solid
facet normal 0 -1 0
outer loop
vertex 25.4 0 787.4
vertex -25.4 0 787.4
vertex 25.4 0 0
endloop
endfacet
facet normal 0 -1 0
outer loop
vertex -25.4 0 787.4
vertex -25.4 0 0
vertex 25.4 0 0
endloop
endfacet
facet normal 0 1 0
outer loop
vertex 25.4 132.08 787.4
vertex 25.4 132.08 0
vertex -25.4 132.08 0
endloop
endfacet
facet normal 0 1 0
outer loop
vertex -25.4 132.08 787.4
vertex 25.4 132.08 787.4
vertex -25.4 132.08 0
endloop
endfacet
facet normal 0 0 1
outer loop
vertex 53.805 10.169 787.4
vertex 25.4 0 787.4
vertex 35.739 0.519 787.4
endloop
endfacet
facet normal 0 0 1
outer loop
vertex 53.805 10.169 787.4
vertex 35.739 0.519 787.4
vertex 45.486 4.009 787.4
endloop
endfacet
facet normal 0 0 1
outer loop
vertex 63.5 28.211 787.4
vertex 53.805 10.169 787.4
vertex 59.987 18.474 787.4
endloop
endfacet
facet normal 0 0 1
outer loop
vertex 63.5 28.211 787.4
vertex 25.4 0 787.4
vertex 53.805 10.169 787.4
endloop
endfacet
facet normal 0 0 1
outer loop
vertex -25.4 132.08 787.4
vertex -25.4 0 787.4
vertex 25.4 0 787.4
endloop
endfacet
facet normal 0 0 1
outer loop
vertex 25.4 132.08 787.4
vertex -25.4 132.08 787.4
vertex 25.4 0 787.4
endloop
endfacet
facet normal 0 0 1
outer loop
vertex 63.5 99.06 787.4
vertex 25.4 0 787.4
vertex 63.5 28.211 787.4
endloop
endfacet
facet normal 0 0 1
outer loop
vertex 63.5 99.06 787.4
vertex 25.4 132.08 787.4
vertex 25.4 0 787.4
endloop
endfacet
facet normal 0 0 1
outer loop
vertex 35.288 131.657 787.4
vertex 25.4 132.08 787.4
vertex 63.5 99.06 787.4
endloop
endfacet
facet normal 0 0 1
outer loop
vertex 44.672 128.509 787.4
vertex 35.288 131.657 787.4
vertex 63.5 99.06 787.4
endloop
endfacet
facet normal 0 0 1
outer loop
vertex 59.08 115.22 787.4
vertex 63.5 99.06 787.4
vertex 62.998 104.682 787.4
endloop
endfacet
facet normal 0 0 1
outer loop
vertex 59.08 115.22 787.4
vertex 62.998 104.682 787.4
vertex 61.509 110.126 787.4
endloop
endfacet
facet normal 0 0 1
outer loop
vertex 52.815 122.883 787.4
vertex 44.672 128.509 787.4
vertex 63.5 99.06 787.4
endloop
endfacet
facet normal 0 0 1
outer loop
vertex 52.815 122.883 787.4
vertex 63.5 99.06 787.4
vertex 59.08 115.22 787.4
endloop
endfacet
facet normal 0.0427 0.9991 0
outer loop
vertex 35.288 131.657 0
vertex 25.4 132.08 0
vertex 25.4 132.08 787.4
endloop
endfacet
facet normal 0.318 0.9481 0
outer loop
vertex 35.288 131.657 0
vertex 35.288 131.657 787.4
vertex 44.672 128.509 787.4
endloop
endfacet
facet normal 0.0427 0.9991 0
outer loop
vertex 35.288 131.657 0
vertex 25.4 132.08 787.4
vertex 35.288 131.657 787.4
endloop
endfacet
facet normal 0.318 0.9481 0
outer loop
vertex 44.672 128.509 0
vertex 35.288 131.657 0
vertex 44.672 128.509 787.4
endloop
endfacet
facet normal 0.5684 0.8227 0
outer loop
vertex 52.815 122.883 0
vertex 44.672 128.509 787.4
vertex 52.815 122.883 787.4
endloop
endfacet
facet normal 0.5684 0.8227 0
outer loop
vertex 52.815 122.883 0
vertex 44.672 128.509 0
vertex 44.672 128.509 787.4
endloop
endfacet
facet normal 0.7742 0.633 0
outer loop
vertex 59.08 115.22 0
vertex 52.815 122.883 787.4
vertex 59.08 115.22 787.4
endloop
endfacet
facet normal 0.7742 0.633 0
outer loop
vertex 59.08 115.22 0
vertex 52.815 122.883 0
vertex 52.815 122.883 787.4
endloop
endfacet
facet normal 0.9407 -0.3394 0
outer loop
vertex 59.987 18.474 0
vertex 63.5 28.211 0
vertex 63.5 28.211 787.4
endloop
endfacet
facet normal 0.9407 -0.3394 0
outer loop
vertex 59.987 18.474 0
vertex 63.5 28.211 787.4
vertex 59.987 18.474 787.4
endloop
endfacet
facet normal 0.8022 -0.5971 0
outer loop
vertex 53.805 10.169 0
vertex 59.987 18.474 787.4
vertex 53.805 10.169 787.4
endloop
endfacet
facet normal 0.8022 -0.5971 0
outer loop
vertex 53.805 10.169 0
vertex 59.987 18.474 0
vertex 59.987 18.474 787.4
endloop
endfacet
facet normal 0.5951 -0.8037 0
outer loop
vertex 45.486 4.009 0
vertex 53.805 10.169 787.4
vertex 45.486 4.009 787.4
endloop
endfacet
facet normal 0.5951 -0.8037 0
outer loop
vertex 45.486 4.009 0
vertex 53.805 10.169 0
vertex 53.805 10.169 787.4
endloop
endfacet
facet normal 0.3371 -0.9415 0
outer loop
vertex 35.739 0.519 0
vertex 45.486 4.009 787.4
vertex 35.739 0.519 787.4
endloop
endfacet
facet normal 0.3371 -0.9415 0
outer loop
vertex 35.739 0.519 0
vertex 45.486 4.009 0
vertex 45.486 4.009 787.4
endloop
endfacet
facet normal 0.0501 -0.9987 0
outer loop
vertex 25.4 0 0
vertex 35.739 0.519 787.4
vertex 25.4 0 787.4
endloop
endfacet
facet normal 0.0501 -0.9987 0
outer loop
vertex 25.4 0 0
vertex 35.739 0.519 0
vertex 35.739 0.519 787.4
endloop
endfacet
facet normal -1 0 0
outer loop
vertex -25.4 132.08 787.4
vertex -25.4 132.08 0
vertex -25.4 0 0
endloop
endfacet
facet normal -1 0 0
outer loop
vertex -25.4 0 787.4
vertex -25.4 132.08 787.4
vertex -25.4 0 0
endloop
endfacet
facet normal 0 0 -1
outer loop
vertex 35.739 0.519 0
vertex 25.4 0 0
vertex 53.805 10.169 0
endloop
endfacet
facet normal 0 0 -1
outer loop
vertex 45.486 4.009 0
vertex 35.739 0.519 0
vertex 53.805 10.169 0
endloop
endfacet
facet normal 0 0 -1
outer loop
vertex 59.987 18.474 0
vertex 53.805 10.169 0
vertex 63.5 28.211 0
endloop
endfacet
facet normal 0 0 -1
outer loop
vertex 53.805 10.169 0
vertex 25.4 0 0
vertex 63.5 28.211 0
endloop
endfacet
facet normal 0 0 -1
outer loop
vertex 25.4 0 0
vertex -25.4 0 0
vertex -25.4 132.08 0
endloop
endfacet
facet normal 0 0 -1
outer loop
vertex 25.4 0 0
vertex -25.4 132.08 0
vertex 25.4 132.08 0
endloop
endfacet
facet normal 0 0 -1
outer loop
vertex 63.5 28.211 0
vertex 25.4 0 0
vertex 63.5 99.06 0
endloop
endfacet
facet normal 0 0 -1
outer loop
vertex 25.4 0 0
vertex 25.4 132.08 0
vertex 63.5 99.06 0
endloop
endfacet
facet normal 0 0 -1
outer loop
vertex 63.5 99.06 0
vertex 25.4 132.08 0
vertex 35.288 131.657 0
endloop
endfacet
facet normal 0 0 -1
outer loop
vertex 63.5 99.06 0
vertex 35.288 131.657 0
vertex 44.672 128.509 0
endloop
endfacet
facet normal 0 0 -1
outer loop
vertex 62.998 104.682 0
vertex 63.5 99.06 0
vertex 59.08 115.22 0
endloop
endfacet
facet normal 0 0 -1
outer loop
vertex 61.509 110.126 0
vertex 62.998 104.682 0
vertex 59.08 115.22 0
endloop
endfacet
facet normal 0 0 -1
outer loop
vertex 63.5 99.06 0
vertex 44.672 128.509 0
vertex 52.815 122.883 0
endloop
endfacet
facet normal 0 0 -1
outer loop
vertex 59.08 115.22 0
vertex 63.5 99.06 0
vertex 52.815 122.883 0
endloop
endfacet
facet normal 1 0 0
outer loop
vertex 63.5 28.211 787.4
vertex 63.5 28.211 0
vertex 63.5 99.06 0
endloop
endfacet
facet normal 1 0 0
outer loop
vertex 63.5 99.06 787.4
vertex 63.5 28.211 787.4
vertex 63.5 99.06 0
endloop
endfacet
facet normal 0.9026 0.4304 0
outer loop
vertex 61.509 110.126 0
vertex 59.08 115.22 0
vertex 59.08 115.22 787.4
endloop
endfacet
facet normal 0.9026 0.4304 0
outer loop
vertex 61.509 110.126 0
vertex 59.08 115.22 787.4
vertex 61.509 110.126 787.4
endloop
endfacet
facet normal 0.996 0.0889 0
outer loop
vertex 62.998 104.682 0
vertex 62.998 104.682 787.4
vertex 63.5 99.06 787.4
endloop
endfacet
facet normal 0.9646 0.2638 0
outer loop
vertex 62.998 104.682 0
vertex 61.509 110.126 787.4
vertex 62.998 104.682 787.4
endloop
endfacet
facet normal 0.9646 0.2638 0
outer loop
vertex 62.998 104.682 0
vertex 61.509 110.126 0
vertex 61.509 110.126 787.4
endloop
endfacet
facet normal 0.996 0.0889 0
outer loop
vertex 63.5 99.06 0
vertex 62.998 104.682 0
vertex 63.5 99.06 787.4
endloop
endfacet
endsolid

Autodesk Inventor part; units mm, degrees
ref_plane "YZ Plane" through (0, 0, 0) normal (1, 0, 0) x (0, 1, 0)
ref_plane "XZ Plane" through (0, 0, 0) normal (0, 1, 0) x (-1, 0, 0)
ref_plane "XY Plane" through (0, 0, 0) normal (0, 0, 1) x (1, 0, 0)
sketch "Sketch1" plane through (0, 0, 0) normal (0, 0, 1) x (1, 0, 0)
  line L0 (0, 0) -> (0, 132.08)
  line L1 (0, 132.08) -> (25.4, 132.08)
  line L2 (0, 66.04) -> (63.5, 66.04)
  line L3 (0, 132.08) -> (0, 66.04)
  line L4 (0, 99.06) -> (31.75, 99.06)
  arc A0 (63.5, 99.06) -> (55.043838, 120.634513) centre (31.75, 99.06) ccw
  line L5 (0, 66.04) -> (0, 0)
  arc A1 (54.194148, 10.562869) -> (63.5, 33.02) centre (31.75, 33.02) ccw
  line L6 (63.5, 28.211314) -> (63.5, 99.06)
  arc A2 (59.079555, 115.220381) -> (25.4, 132.08) centre (28.846947, 96.896052) ccw
  line L7 (0, 0) -> (25.4, 0)
  arc A3 (25.4, 0) -> (63.5, 28.211314) centre (28.813006, 35.223762) ccw
  line L8 (0, 132.08) -> (-25.4, 132.08)
  line L9 (0, 1.27) -> (0, 132.08)
  line L10 (0, 132.08) -> (-25.4, 132.08)
  line L11 (-25.4, 132.08) -> (-25.4, 1.27)
  line L12 (-25.4, 0) -> (0, 0)
  line L13 (0, 0) -> (0, 132.08)
  line L14 (0, 132.08) -> (-25.4, 132.08)
  line L15 (-25.4, 132.08) -> (-25.4, 0)
  dimension "d0" = 132.08
  dimension "d1" = 25.4
  dimension "d2" = 63.5
  dimension "d3" = 25.4
  dimension "d4" = 25.4
sketch "Sketch1 outline for Extrusion1" plane through (0, 0, 0) normal (0, 0, 1) x (1, 0, 0)
  line L0 (-25.4, 0) -> (25.4, 0)
  arc A0 (25.4, 0) -> (63.5, 28.211314) centre (28.813006, 35.223762) ccw
  line L1 (63.5, 28.211314) -> (63.5, 99.06)
  arc A1 (63.5, 99.06) -> (59.079555, 115.220381) centre (31.75, 99.06) ccw
  arc A2 (59.079555, 115.220381) -> (25.4, 132.08) centre (28.846947, 96.896052) ccw
  line L2 (25.4, 132.08) -> (-25.4, 132.08)
  line L3 (-25.4, 132.08) -> (-25.4, 0)
extrude "Extrusion1" add sketch "Sketch1 outline for Extrusion1" along normal blind 787.4
properties part number "Robot Bumper (31 inches)"
